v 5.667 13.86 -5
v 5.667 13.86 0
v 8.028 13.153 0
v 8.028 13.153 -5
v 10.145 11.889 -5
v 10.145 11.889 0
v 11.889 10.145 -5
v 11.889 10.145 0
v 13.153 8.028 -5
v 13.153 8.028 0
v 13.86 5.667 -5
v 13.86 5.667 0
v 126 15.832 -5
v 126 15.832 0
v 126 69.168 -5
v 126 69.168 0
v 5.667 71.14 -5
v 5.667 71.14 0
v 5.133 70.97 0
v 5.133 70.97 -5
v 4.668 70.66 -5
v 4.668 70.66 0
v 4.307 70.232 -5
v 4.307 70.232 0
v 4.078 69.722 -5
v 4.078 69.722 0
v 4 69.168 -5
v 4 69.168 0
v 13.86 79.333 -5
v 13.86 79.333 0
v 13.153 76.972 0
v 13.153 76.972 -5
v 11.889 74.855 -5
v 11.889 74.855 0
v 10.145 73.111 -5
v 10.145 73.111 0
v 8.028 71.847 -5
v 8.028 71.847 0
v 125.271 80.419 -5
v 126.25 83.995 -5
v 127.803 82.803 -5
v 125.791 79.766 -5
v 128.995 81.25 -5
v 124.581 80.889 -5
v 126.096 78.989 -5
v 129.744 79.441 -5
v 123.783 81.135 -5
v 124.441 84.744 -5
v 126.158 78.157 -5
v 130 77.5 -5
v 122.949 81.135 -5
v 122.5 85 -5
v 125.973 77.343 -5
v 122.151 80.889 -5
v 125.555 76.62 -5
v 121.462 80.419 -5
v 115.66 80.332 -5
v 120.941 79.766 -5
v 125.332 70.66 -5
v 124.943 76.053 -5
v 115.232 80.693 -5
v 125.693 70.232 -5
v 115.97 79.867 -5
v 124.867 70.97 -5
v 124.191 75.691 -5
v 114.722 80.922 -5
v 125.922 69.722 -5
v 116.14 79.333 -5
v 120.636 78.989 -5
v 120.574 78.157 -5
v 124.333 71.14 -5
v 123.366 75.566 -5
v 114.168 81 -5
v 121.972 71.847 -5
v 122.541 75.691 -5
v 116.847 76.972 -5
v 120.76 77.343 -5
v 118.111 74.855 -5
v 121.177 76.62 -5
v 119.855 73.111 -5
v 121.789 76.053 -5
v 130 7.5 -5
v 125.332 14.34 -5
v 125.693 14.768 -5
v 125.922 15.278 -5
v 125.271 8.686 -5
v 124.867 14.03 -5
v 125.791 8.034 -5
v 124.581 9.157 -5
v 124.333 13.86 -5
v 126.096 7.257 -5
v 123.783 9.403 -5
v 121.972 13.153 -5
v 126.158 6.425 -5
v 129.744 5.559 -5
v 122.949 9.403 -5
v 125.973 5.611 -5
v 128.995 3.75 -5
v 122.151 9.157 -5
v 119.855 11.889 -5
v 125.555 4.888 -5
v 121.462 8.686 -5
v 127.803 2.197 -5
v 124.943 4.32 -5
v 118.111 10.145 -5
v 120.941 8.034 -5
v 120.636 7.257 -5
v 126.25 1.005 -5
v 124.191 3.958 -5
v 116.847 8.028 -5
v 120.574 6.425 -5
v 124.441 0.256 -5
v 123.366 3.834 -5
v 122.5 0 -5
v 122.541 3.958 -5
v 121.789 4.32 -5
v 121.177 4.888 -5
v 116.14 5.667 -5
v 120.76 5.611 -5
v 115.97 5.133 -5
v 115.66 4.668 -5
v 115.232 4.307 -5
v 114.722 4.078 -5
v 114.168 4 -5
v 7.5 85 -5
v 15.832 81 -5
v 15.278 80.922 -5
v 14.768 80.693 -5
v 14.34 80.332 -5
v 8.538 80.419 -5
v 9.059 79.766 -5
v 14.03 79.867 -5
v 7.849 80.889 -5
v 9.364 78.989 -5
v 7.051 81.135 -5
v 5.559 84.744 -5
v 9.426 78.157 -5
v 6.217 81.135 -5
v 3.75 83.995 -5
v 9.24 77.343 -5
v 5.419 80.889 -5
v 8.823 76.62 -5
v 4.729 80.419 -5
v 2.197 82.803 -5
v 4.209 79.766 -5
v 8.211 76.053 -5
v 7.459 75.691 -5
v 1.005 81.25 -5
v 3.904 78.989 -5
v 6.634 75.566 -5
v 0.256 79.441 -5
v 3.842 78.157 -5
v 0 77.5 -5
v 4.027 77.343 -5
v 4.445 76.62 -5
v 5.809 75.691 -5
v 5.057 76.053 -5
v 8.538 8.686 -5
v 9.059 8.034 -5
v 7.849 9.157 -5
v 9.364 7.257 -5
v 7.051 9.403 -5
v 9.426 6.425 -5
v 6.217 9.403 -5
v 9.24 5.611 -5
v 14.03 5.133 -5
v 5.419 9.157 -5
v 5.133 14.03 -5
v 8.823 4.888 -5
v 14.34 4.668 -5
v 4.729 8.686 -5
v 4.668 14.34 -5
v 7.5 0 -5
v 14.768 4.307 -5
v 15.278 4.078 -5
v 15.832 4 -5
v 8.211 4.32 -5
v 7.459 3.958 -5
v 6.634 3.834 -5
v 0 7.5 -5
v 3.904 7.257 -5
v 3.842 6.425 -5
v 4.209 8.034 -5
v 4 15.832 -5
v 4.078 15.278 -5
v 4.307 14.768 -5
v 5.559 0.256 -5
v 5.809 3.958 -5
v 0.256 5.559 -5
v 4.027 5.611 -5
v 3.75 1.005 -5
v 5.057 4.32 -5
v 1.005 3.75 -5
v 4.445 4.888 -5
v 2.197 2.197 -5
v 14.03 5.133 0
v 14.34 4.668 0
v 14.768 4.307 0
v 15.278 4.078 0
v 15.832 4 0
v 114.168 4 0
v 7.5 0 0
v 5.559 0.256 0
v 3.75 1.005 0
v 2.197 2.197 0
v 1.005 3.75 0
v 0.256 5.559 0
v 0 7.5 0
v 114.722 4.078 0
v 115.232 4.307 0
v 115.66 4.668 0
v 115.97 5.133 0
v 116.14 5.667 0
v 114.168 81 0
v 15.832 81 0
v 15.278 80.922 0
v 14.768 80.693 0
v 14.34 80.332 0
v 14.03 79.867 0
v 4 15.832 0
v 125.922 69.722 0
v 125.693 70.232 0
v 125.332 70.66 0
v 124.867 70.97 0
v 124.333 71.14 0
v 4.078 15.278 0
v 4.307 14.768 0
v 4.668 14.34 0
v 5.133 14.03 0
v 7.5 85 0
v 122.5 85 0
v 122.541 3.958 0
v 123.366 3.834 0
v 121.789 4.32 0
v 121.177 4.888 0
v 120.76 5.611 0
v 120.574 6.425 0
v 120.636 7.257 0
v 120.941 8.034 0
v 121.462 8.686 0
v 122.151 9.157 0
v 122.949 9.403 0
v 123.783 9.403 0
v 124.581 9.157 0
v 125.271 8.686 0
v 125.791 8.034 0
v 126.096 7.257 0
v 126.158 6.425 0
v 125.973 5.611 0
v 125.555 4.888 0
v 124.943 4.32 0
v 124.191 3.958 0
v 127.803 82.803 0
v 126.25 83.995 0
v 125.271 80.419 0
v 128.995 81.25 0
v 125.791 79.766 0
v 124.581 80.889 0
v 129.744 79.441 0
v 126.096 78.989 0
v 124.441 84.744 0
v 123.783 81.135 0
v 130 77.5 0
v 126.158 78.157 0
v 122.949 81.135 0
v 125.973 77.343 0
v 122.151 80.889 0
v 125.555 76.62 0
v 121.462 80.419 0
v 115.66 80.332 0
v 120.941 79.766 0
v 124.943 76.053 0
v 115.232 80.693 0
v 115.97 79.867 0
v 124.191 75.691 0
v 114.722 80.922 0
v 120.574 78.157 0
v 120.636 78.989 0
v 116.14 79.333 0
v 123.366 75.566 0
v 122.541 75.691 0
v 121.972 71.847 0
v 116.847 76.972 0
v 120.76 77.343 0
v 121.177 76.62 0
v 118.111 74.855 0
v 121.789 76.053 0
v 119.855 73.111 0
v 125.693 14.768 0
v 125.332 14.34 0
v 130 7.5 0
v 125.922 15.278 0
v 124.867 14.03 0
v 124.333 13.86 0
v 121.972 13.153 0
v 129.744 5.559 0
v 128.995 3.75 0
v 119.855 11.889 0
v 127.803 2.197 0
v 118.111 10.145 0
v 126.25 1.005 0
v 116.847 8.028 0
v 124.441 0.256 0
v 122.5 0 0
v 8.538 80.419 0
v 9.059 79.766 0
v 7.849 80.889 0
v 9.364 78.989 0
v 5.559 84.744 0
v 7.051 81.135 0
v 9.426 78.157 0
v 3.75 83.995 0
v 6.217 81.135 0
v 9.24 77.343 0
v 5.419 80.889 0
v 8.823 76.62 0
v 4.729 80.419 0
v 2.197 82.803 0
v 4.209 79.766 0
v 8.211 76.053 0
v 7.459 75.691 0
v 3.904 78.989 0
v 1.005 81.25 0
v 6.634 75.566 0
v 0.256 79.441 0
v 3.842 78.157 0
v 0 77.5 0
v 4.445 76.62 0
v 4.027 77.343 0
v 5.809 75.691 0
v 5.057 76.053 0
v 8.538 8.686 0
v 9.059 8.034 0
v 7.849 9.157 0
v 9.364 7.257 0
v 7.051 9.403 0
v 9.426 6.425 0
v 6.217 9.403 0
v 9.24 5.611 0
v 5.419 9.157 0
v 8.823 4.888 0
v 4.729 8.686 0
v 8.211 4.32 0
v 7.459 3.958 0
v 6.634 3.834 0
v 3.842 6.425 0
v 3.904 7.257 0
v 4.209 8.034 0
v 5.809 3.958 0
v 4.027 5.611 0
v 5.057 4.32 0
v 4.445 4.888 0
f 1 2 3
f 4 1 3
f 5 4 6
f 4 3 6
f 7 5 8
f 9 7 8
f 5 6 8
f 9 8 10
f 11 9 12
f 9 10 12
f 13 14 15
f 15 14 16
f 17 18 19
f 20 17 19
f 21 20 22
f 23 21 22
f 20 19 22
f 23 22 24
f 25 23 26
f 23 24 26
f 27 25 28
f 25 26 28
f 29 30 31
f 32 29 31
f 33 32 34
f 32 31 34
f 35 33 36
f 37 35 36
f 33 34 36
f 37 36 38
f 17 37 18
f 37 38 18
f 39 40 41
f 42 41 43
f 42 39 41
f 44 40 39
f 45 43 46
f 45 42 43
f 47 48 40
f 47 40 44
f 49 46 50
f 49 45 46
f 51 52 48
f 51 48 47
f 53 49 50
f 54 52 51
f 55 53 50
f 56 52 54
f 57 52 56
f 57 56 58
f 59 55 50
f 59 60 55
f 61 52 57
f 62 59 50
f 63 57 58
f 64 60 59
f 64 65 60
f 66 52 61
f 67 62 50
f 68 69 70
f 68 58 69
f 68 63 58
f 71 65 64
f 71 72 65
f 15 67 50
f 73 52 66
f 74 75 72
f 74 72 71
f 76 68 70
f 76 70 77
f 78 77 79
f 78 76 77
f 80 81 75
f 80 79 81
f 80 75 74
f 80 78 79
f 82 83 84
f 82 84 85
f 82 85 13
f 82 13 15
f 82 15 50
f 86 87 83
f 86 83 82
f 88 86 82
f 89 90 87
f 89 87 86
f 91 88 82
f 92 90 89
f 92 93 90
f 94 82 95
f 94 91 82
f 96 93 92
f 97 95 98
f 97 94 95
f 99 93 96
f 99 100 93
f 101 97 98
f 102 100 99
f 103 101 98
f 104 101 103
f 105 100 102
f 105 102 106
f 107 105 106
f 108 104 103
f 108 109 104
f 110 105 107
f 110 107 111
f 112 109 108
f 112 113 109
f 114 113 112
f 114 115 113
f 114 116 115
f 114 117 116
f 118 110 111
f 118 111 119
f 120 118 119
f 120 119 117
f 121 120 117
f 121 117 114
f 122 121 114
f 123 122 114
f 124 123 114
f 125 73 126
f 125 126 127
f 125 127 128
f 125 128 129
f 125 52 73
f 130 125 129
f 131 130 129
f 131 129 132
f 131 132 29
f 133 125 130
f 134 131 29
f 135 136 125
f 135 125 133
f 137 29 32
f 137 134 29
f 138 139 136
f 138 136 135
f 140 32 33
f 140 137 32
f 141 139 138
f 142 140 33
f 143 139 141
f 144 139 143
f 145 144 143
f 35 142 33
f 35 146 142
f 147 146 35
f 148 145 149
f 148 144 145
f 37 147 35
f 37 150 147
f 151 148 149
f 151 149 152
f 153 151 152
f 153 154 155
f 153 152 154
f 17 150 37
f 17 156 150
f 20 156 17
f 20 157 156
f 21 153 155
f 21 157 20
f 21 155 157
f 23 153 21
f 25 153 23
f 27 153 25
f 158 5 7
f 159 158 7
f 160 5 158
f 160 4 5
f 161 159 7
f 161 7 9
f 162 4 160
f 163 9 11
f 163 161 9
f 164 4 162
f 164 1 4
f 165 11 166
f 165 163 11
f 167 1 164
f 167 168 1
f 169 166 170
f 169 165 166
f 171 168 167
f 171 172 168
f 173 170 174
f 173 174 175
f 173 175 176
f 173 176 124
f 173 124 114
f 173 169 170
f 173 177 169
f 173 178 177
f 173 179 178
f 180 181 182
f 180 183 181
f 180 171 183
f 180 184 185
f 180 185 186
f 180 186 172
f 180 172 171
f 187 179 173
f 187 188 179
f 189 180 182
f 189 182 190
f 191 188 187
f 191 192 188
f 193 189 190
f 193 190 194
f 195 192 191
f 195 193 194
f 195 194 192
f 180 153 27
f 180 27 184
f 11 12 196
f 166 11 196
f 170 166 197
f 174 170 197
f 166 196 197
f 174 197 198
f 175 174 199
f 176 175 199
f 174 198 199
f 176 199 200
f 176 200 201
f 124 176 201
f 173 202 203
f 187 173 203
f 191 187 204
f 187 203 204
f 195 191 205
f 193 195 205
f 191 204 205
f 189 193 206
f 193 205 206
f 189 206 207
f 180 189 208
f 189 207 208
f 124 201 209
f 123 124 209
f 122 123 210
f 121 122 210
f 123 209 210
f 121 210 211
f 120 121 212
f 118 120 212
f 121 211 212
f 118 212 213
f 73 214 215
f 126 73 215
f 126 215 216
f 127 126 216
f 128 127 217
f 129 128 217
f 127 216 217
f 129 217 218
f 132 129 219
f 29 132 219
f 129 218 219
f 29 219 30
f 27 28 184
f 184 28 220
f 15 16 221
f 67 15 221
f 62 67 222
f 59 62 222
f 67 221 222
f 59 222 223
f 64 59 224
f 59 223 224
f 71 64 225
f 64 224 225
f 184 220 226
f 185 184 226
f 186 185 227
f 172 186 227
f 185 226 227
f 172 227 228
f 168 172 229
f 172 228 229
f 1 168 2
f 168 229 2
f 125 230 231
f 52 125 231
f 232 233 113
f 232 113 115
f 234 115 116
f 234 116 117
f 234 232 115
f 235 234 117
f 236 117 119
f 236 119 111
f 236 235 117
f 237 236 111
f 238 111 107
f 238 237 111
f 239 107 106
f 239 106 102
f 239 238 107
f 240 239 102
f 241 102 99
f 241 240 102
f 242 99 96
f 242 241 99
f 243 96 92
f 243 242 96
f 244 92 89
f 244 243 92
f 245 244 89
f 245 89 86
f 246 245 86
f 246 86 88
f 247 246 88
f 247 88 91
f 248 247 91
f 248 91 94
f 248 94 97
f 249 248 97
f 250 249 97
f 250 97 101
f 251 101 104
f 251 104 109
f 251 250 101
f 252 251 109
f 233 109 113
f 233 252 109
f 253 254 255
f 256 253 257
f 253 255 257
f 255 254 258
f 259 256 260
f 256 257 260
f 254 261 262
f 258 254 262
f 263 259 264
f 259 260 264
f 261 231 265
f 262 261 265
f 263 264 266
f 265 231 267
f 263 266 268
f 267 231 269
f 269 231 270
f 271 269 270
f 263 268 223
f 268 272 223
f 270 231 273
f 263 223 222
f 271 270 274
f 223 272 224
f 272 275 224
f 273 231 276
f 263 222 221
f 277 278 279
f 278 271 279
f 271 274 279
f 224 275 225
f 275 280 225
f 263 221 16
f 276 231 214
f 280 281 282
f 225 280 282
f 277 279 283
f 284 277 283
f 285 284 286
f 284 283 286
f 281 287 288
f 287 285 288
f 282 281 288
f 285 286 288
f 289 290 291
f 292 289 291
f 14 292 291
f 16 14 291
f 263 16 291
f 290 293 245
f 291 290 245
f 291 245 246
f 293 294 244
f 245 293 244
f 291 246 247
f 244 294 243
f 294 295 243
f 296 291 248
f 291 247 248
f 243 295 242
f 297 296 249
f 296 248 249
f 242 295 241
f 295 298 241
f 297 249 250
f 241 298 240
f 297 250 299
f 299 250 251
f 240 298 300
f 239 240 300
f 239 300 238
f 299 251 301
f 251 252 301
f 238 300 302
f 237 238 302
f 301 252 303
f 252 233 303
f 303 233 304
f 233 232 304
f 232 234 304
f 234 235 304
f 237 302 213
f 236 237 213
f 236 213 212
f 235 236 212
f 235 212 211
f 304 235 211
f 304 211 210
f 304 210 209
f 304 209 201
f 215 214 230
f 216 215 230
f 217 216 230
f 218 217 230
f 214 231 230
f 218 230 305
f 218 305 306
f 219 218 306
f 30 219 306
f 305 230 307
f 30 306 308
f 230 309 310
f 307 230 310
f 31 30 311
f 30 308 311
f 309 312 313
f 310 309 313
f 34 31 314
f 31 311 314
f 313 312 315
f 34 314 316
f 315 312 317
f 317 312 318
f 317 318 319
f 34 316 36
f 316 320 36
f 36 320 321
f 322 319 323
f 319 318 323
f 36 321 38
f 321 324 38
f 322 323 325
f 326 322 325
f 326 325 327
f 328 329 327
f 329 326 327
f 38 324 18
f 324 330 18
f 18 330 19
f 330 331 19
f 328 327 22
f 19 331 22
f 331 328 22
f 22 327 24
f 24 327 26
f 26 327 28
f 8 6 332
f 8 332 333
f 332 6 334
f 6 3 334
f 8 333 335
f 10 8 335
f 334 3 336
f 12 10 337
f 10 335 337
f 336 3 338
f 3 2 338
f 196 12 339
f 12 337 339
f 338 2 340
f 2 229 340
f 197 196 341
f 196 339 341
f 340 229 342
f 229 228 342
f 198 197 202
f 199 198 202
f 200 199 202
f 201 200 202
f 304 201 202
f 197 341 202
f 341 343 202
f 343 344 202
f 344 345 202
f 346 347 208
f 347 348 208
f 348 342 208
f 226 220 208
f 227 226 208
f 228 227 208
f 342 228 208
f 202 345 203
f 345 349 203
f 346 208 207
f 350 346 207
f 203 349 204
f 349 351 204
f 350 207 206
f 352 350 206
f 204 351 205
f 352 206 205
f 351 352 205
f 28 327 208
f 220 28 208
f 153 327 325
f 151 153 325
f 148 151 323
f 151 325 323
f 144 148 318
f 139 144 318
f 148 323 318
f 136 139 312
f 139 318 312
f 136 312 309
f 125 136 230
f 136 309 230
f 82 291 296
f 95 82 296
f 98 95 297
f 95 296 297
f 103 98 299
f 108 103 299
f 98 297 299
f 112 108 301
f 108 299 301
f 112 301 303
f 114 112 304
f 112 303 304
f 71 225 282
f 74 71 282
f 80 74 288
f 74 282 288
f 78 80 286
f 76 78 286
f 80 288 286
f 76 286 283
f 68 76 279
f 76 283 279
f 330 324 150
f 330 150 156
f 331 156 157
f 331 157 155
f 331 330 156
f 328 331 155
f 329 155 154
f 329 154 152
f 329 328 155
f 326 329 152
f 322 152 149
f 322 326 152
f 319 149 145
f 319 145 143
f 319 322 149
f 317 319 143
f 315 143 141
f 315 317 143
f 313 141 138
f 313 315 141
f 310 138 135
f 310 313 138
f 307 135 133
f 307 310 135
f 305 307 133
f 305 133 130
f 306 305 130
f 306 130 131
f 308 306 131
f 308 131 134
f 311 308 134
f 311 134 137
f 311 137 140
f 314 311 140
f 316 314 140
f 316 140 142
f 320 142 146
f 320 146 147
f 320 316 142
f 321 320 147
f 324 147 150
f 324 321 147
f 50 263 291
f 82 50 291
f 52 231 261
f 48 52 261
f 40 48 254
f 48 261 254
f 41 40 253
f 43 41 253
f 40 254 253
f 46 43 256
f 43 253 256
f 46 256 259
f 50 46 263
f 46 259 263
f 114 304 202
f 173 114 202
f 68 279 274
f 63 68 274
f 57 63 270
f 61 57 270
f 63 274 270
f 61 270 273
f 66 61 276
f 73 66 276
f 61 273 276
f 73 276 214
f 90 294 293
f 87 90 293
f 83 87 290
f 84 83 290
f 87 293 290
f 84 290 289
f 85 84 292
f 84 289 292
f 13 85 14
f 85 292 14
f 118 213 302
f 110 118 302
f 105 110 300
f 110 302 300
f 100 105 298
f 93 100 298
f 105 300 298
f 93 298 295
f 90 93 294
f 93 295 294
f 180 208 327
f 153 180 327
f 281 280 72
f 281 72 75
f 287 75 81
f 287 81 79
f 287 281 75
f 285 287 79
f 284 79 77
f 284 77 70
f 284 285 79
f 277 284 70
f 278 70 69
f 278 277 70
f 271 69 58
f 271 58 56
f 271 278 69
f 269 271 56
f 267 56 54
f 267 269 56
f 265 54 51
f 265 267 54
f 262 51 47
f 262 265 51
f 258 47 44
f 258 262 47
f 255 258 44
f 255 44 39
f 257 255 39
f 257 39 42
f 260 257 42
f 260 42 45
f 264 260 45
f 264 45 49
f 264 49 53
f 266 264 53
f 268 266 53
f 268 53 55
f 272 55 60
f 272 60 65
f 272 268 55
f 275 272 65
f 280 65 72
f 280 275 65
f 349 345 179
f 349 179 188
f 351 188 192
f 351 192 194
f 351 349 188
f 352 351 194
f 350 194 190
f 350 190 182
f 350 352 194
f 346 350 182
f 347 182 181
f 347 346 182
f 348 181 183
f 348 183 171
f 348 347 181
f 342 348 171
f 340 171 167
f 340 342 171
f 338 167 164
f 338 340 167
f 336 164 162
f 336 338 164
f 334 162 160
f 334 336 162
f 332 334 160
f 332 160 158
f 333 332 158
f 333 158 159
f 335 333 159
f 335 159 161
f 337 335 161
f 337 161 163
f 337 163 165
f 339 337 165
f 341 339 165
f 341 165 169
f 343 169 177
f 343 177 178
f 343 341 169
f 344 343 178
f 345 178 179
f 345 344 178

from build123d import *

# Parameters (mm, degrees)
SHAPEBINDER_R = 2.8
PAD_DEPTH     = 5


with BuildPart() as part:
    # ShapeBinder → Pad (new body)
    with BuildSketch(Plane(origin=(65, 42.5, 0), x_dir=(0, -1, 0), z_dir=(0, 0, -1))):
        with BuildLine():
            Line((35, 65), (-35, 65))
            ThreePointArc((-35, 65), (-40.303301, 62.803301), (-42.5, 57.5))
            Line((-42.5, 57.5), (-42.5, -57.5))
            ThreePointArc((-42.5, -57.5), (-40.303301, -62.803301), (-35, -65))
            Line((-35, -65), (0.97016, -65))
            Line((0.97016, -65), (16.010767, -65))
            Line((16.010767, -65), (35, -65))
            ThreePointArc((35, -65), (40.303301, -62.803301), (42.5, -57.5))
            Line((42.5, -57.5), (42.5, 57.5))
            ThreePointArc((42.5, 57.5), (40.303301, 62.803301), (35, 65))
        make_face()
        with Locations((35.866117, 58.366117)):
            Circle(SHAPEBINDER_R, mode=Mode.SUBTRACT)
        with Locations((35.866117, -58.366117)):
            Circle(SHAPEBINDER_R, mode=Mode.SUBTRACT)
        with Locations((-35.866117, 58.366117)):
            Circle(SHAPEBINDER_R, mode=Mode.SUBTRACT)
        with BuildLine():
            ThreePointArc((28.639867, 59.333333), (31.428932, 53.928932), (36.833333, 51.139867))
            ThreePointArc((36.833333, 51.139867), (38.027525, 50.458835), (38.5, 49.16784))
            Line((38.5, 49.16784), (38.5, -49.16784))
            ThreePointArc((38.5, -49.16784), (38.027525, -50.458835), (36.833333, -51.139867))
            ThreePointArc((36.833333, -51.139867), (31.428932, -53.928932), (28.639867, -59.333333))
            ThreePointArc((28.639867, -59.333333), (27.958835, -60.527525), (26.66784, -61))
            Line((26.66784, -61), (-26.66784, -61))
            ThreePointArc((-26.66784, -61), (-27.958835, -60.527525), (-28.639867, -59.333333))
            ThreePointArc((-28.639867, -59.333333), (-31.428932, -53.928932), (-36.833333, -51.139867))
            ThreePointArc((-36.833333, -51.139867), (-38.027525, -50.458835), (-38.5, -49.16784))
            Line((-38.5, -49.16784), (-38.5, 49.16784))
            ThreePointArc((-38.5, 49.16784), (-38.027525, 50.458835), (-36.833333, 51.139867))
            ThreePointArc((-36.833333, 51.139867), (-31.428932, 53.928932), (-28.639867, 59.333333))
            ThreePointArc((-28.639867, 59.333333), (-27.958835, 60.527525), (-26.66784, 61))
            Line((-26.66784, 61), (26.66784, 61))
            ThreePointArc((26.66784, 61), (27.958835, 60.527525), (28.639867, 59.333333))
        make_face(mode=Mode.SUBTRACT)
        with Locations((-35.866117, -58.366117)):
            Circle(SHAPEBINDER_R, mode=Mode.SUBTRACT)
    extrude(amount=PAD_DEPTH)


solid = part.part
